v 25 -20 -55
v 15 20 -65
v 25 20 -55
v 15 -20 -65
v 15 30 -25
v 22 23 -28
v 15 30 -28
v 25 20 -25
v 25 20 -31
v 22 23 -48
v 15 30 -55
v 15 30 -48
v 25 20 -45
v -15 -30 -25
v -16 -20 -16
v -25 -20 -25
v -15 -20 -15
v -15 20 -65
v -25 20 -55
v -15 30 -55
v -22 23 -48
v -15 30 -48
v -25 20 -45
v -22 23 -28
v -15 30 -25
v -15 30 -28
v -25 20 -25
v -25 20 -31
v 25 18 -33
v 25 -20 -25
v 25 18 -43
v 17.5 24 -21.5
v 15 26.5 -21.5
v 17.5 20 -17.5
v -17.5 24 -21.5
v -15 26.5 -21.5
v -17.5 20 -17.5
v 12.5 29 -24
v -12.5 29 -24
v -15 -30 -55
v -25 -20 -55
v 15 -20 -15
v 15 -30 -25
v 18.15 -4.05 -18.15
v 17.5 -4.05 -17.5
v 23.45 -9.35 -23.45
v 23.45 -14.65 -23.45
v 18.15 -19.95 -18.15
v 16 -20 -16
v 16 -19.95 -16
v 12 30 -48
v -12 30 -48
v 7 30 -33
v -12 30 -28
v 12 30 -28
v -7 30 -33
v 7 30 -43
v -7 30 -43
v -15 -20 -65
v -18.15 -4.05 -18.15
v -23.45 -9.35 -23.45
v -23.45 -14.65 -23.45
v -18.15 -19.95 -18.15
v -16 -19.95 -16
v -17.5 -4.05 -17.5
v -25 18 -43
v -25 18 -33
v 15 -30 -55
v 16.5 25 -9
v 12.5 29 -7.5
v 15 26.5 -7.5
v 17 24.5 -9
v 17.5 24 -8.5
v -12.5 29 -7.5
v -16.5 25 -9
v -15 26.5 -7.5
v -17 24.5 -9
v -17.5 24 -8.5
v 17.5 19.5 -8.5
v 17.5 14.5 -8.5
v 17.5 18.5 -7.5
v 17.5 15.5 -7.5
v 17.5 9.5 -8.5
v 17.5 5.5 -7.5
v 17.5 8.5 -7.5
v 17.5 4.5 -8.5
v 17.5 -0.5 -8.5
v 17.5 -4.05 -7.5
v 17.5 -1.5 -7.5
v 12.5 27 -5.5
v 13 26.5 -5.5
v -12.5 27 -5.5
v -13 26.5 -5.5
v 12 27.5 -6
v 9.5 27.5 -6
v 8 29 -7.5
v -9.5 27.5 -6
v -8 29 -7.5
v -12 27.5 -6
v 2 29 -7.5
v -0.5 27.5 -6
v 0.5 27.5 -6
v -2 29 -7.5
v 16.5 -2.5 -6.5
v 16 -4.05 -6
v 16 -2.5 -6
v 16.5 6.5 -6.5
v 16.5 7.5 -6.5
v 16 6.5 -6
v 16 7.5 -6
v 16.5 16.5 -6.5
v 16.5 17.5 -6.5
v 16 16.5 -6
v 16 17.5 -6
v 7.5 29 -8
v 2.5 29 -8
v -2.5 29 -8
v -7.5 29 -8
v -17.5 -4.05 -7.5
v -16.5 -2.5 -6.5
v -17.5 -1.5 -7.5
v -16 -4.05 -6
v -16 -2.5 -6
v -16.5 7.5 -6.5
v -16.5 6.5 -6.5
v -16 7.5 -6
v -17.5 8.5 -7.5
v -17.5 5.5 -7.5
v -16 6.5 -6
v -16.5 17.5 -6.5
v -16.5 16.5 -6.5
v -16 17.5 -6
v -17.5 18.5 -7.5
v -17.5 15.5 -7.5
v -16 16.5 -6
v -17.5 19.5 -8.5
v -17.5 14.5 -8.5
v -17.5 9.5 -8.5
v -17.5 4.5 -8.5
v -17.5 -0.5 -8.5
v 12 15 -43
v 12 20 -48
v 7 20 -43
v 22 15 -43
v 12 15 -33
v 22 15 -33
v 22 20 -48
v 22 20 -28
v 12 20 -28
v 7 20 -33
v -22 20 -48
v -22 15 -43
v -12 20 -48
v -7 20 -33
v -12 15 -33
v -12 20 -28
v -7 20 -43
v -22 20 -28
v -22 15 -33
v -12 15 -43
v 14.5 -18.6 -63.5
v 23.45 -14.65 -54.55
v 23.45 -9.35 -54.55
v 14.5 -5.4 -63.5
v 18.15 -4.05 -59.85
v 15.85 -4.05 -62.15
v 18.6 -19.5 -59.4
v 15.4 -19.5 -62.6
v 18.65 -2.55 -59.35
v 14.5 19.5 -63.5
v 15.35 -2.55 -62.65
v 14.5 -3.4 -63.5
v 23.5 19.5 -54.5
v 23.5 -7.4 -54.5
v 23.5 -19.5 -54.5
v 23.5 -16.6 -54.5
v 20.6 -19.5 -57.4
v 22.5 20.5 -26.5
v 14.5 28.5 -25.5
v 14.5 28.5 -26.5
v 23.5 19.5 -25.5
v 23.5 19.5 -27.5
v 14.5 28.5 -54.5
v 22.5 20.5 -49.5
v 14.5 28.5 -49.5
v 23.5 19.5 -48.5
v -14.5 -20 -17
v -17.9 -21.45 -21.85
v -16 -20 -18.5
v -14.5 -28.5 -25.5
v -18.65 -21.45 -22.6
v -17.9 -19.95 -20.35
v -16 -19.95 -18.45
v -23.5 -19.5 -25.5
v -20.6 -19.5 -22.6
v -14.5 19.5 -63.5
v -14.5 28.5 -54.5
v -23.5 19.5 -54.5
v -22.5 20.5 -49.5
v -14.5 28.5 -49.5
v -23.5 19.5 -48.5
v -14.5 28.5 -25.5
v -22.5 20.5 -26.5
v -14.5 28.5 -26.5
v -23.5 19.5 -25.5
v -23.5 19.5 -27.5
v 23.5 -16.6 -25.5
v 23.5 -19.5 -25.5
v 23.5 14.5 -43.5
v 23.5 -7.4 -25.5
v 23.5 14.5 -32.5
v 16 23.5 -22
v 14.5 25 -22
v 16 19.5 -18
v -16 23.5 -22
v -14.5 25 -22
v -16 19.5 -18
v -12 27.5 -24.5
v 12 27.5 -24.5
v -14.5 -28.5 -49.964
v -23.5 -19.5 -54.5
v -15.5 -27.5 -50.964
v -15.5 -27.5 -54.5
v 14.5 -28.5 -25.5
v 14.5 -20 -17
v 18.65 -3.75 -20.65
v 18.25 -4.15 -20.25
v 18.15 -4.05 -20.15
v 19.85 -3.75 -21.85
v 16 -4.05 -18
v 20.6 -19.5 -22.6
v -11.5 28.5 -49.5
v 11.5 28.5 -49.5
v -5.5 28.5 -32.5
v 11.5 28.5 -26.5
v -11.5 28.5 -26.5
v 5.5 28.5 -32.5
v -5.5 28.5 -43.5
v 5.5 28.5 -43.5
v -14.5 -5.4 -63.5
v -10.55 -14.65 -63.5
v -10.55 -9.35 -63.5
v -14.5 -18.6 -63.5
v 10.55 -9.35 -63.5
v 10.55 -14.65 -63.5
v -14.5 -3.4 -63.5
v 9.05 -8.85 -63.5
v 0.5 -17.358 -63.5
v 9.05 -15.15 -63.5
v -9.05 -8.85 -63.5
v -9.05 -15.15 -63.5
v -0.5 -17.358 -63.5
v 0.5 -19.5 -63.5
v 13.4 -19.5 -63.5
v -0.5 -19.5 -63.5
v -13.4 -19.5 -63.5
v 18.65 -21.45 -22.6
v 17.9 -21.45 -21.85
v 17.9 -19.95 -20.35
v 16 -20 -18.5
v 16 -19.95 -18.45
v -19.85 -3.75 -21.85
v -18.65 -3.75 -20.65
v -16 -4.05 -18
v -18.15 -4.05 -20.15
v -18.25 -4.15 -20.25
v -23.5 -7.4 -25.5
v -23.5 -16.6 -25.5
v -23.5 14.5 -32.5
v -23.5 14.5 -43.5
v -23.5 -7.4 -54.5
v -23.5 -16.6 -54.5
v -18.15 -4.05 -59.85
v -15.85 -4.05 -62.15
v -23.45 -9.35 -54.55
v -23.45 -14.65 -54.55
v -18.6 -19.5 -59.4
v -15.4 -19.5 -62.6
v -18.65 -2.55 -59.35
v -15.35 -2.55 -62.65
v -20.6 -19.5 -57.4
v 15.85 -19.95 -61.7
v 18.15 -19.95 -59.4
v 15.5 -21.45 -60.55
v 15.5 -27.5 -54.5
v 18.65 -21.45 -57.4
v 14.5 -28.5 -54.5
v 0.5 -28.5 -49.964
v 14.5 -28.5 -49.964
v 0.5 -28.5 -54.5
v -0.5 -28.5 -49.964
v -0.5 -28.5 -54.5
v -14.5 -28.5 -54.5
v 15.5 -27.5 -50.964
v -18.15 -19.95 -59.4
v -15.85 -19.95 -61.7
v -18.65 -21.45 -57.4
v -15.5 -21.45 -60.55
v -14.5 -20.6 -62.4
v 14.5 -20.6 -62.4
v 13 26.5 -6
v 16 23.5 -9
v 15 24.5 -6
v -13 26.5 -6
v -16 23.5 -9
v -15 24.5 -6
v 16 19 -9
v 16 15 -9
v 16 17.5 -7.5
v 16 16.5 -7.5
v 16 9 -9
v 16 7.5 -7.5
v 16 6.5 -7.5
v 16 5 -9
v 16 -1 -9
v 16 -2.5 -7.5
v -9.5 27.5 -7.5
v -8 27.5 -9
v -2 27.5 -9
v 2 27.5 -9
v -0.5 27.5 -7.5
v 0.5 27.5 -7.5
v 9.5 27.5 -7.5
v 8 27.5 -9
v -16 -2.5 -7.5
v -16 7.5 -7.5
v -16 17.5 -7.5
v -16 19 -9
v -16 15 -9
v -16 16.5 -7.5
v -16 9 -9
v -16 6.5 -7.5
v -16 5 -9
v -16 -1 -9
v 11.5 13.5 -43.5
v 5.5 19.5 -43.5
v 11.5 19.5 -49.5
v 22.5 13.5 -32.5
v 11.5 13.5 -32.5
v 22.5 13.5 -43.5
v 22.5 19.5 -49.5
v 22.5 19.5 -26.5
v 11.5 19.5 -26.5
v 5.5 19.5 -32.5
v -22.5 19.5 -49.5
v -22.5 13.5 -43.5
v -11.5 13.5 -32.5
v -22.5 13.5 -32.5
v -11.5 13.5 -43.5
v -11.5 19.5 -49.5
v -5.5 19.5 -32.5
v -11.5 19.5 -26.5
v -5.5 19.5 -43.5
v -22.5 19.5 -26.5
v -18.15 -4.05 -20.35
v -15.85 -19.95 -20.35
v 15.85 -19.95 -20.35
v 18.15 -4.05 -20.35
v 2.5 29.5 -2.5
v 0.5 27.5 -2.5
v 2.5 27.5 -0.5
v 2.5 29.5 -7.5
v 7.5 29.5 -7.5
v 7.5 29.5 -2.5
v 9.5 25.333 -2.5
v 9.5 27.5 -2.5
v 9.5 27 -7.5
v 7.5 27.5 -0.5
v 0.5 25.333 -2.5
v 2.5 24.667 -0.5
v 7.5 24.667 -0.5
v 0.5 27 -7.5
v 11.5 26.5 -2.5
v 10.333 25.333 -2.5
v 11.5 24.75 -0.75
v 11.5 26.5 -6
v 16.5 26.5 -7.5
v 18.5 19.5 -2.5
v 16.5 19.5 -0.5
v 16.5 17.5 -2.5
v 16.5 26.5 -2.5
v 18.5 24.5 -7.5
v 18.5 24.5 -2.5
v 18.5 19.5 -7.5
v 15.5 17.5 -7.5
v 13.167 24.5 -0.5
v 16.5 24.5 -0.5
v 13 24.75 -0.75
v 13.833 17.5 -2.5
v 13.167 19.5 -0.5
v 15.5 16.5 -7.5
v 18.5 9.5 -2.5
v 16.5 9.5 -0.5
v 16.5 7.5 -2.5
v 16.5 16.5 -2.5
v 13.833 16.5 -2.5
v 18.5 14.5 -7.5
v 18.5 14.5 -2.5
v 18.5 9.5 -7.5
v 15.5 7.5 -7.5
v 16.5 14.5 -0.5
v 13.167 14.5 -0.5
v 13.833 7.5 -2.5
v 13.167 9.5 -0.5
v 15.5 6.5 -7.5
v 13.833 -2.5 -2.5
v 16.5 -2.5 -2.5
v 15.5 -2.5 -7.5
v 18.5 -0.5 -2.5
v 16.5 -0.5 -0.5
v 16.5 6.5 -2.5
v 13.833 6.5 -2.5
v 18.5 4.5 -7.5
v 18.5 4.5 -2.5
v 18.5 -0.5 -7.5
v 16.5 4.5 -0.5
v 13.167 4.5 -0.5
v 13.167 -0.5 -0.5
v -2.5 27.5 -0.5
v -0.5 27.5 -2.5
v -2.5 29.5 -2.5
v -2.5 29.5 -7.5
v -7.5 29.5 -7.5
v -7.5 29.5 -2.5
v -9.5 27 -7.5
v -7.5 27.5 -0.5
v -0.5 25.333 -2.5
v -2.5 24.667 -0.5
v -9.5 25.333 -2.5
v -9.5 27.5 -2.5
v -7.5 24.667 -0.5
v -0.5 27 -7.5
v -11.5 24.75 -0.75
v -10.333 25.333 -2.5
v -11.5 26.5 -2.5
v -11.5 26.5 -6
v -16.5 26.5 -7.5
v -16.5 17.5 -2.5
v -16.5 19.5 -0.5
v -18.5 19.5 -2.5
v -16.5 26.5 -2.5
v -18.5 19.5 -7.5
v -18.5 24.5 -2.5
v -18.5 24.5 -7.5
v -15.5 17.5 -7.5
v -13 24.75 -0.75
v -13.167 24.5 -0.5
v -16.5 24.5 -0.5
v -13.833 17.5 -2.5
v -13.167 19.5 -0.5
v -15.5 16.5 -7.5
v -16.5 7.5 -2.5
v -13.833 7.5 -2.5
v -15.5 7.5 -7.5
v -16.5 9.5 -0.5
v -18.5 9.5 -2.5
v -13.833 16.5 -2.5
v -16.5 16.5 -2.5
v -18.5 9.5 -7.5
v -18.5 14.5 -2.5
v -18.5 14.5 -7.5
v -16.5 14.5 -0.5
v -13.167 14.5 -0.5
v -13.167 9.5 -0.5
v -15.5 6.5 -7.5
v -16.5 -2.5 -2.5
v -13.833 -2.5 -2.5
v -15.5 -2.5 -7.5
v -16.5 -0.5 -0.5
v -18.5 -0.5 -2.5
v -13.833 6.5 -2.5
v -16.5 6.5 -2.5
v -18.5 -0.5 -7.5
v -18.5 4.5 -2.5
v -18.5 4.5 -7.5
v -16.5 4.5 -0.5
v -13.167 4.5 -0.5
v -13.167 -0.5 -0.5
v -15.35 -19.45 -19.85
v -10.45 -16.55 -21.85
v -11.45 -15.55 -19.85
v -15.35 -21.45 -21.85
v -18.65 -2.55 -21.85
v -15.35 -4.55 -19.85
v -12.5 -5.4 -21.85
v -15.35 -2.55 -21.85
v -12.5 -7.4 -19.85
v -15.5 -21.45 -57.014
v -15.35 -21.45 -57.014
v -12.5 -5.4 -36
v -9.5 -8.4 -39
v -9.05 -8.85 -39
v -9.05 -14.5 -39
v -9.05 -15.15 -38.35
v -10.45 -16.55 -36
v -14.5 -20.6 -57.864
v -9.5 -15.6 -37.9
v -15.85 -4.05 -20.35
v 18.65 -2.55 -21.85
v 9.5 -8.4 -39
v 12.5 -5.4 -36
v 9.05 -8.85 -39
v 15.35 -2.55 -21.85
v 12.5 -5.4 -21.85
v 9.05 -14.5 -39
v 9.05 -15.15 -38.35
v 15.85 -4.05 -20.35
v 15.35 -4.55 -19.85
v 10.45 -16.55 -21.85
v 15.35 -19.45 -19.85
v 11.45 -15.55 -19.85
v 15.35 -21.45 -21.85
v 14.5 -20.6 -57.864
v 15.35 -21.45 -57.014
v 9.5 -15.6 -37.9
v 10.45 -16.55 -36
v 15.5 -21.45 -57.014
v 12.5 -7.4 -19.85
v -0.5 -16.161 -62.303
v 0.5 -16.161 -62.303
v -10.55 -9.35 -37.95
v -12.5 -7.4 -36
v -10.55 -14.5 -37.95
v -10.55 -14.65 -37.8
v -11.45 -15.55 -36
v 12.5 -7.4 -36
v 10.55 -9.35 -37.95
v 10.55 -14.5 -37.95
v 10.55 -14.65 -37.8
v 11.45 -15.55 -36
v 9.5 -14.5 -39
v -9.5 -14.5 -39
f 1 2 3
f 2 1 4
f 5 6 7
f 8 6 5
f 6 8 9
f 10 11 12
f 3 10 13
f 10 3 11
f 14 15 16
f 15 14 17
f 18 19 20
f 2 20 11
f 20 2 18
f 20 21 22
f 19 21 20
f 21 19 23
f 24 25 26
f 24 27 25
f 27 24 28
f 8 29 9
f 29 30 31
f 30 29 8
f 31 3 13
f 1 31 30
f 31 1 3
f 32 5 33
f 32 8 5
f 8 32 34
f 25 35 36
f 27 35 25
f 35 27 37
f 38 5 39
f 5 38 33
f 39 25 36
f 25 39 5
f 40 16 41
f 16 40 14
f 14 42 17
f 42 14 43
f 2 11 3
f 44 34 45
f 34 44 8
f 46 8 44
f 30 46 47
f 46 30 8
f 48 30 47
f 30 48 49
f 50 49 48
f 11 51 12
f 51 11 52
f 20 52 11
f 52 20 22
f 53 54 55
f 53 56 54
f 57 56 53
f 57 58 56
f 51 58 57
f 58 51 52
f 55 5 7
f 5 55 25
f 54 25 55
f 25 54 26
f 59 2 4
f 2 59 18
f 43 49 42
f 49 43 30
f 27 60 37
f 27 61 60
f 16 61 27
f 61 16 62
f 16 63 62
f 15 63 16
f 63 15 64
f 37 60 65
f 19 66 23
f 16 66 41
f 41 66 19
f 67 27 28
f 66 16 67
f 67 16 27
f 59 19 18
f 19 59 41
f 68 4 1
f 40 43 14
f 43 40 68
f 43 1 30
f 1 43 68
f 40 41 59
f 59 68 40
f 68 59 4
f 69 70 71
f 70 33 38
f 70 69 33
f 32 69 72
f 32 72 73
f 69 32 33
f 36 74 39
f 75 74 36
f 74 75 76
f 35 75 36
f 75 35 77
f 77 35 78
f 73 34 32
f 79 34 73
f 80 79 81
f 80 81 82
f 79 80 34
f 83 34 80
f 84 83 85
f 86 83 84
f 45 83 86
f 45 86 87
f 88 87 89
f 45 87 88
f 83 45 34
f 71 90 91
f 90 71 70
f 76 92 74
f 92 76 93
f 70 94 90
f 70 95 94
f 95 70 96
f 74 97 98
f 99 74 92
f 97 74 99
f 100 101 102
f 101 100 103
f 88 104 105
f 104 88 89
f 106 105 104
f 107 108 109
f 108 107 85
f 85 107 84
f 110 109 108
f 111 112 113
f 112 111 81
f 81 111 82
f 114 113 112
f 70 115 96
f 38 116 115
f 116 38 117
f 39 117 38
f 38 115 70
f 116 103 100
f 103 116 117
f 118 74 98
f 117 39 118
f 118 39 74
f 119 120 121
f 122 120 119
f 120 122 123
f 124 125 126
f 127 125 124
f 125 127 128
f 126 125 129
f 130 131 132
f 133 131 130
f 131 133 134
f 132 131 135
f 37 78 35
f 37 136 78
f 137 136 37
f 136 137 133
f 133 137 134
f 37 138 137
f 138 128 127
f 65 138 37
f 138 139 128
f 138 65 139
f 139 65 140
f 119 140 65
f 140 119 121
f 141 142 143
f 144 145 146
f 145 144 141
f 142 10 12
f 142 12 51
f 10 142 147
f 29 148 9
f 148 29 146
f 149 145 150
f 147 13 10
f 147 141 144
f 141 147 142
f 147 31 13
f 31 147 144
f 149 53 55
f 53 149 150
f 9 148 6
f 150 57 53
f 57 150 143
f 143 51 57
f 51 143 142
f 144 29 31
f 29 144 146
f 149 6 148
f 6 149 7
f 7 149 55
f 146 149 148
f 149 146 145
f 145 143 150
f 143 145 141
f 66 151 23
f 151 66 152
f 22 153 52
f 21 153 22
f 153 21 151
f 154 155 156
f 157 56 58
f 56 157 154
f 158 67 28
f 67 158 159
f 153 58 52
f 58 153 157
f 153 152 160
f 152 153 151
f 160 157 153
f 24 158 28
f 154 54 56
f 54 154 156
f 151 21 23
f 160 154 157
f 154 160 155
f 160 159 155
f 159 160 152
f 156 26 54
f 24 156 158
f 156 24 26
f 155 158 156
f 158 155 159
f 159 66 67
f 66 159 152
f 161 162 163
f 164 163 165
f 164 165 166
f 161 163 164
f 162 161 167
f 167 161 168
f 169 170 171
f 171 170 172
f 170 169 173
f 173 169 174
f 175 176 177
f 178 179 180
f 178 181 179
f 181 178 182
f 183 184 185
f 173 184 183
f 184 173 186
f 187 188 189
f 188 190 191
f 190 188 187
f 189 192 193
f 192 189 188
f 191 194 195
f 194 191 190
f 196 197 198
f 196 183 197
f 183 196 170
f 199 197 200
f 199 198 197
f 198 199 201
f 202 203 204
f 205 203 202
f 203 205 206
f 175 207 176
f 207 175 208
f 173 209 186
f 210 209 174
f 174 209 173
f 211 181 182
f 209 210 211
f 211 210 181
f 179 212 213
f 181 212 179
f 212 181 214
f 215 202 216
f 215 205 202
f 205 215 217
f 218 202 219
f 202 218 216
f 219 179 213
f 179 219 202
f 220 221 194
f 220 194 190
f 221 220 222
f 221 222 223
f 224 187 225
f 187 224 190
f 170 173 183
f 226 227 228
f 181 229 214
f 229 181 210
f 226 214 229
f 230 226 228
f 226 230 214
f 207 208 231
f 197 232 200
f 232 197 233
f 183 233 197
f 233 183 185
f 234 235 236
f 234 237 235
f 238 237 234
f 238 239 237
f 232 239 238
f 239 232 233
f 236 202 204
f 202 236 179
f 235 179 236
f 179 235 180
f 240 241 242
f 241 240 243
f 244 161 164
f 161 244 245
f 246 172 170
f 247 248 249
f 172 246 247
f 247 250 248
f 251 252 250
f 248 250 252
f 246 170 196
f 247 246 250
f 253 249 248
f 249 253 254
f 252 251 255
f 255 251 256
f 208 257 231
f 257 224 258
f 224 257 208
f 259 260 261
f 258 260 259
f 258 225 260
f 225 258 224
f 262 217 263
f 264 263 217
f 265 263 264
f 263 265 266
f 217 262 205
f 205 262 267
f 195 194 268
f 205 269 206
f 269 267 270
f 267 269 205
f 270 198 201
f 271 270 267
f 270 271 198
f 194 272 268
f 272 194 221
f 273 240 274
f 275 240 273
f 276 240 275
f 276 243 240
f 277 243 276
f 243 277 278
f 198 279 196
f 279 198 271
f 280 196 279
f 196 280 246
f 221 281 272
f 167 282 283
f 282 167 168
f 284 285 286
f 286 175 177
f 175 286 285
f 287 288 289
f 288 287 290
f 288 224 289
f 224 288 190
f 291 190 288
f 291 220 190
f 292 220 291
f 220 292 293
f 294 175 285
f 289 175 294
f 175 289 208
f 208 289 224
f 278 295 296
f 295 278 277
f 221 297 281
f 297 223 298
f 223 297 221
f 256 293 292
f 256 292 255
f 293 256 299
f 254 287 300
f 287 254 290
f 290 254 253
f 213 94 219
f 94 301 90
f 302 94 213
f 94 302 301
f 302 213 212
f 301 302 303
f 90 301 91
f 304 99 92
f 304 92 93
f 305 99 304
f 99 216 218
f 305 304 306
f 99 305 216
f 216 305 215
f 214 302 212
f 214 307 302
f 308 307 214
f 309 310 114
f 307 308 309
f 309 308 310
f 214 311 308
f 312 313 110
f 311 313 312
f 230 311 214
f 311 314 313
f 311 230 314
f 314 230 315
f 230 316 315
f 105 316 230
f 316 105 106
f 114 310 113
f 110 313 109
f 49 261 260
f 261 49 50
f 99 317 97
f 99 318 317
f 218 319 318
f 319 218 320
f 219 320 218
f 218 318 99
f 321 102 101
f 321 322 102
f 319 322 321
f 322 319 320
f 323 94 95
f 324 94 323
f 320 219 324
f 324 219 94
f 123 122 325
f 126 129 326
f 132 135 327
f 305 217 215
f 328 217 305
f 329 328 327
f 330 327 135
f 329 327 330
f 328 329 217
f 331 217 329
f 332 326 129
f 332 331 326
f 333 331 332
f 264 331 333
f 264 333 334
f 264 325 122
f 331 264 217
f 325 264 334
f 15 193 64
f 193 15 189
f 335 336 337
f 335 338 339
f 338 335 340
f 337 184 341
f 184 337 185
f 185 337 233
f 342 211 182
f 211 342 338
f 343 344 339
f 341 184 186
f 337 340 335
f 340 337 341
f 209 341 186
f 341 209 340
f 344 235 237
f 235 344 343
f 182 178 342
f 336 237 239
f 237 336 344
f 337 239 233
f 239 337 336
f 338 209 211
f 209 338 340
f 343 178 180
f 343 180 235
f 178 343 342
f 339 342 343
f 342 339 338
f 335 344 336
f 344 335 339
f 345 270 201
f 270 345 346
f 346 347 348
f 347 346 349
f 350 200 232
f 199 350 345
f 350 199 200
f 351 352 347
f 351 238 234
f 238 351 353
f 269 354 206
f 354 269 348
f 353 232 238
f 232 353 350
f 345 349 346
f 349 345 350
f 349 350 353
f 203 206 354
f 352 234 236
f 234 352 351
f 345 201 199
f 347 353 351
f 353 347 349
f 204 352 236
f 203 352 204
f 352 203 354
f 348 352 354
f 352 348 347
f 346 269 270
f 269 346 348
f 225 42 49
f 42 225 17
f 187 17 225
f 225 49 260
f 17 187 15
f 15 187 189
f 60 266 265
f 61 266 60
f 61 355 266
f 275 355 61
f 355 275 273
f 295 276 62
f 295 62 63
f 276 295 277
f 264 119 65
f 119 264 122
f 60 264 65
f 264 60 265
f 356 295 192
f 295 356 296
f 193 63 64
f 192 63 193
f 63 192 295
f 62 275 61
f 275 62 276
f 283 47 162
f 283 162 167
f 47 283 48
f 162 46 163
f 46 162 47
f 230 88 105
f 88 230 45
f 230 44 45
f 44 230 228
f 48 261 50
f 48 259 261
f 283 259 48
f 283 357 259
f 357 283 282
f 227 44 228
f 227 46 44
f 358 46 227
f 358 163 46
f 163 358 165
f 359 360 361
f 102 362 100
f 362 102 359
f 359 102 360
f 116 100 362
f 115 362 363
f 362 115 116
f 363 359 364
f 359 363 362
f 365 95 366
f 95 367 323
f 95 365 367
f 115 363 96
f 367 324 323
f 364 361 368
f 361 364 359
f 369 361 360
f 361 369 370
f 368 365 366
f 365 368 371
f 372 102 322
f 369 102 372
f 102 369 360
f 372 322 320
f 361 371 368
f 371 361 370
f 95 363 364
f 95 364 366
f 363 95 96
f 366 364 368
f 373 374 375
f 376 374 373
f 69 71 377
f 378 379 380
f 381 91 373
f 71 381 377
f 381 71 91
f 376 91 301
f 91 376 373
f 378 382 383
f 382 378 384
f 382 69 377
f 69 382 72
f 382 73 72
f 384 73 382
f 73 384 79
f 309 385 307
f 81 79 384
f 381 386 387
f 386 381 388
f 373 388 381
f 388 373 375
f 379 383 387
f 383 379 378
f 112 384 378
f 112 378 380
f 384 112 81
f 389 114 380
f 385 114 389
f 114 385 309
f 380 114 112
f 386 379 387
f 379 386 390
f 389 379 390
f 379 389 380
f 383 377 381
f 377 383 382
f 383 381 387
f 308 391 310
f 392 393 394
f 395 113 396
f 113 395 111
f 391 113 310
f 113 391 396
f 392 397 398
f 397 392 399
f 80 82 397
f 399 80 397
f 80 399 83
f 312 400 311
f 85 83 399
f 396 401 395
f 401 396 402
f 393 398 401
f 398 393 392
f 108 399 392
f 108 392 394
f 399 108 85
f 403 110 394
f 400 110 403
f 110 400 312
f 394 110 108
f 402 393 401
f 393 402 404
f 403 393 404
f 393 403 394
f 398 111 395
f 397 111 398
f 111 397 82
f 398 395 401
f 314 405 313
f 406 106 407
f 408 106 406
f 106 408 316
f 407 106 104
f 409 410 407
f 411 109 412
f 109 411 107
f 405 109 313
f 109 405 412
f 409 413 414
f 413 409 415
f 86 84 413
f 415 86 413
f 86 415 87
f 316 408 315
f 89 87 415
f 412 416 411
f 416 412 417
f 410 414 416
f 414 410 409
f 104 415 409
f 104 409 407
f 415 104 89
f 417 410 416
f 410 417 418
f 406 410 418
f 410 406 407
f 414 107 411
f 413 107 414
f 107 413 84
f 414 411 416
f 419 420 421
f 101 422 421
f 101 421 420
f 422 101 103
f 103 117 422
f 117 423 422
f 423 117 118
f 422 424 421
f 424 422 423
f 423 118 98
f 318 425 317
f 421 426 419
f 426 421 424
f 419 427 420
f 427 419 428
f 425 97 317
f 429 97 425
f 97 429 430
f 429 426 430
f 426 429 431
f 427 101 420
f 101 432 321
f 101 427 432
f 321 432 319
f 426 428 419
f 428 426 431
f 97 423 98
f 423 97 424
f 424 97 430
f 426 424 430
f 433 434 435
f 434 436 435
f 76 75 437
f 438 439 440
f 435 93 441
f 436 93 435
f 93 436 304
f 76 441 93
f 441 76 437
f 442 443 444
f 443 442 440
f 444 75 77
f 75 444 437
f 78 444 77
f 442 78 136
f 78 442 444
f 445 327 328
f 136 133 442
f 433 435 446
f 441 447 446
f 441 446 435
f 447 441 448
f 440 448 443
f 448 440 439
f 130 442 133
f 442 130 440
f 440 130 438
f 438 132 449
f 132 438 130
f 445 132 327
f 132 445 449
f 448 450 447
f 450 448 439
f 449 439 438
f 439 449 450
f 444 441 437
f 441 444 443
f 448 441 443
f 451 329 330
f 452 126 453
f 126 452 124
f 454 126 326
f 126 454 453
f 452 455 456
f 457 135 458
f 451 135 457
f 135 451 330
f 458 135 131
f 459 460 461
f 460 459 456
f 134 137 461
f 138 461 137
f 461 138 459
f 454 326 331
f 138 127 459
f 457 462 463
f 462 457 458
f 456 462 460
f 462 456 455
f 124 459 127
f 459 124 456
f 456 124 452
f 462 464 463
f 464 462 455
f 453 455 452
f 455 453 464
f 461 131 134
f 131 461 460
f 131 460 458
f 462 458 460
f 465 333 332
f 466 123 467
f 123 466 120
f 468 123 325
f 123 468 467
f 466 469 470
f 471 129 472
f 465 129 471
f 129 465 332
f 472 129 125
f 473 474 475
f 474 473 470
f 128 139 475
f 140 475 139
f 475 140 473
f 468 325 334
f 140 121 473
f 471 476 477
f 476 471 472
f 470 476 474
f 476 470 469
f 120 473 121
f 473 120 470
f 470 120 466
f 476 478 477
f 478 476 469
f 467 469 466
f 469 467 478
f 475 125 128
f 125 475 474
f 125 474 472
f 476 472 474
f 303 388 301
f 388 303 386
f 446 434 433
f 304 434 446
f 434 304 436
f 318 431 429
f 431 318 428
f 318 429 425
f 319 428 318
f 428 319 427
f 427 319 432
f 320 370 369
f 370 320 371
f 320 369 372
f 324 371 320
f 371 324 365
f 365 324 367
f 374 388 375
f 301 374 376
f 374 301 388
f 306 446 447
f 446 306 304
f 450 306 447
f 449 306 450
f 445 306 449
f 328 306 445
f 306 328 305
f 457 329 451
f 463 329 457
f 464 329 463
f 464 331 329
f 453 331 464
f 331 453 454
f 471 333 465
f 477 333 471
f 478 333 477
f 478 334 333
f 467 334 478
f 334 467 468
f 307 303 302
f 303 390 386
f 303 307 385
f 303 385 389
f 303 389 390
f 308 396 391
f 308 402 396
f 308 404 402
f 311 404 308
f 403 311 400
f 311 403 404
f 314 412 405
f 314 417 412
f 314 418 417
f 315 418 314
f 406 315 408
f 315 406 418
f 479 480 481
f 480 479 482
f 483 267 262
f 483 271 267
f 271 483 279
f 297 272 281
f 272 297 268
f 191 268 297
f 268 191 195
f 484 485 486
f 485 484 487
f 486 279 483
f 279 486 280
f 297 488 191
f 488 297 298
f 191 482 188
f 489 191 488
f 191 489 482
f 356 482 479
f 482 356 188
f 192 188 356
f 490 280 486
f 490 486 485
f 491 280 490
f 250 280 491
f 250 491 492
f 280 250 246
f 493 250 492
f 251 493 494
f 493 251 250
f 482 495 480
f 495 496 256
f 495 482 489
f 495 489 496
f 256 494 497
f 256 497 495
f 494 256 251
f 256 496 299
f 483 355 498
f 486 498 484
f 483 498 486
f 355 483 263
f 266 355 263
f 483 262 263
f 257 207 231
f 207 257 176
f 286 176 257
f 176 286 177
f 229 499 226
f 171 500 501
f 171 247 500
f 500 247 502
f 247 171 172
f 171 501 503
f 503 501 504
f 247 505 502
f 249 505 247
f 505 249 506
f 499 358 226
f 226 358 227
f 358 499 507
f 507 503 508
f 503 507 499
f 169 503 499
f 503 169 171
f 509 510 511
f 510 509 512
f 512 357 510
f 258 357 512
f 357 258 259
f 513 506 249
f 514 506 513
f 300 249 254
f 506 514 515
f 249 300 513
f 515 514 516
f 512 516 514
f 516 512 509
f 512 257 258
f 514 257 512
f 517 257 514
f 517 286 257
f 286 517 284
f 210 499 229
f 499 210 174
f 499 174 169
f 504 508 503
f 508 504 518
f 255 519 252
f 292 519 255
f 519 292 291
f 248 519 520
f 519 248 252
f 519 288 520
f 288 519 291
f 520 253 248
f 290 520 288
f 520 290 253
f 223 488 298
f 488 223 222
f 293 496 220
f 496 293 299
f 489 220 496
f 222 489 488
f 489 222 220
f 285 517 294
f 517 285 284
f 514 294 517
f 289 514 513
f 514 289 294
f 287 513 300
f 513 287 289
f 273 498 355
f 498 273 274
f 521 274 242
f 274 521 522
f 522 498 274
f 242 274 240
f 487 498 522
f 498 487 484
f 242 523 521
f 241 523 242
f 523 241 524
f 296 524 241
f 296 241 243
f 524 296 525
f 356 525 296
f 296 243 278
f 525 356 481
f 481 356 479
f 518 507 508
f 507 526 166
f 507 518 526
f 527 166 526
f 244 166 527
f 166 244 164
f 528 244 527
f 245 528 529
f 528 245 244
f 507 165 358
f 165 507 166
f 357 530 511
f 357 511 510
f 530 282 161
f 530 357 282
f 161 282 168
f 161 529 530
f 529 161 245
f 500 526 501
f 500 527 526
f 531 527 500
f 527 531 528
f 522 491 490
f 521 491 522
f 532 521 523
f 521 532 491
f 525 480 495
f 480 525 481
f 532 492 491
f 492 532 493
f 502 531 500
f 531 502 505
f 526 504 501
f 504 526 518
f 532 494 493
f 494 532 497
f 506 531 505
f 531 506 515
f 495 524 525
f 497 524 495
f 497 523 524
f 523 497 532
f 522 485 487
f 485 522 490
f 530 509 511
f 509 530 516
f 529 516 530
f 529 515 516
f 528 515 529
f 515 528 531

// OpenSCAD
module camera(){
	translate([0,0,32.5]){
		cube([65,65,65],center=true);
	};
};
module cell(){
	translate([0,0,49.5]){
		//cube([18,26,1],center=true);
	};
	translate([0,6,45]){
		cylinder(3,4,4);
	};
	translate([0,-6,45]){
		cylinder(3,3,3);
	};
	translate([0,0,22.5]){
		cube([18,26,45],center=true);
	};
};
//cell();
module gem(size,cha){
	hull(){
		translate([cha,0,0]){cube(size,center=true);};
		translate([-cha,0,0]){cube(size,center=true);};
		translate([0,0,cha]){cube(size,center=true);};
		translate([0,0,-cha]){cube(size,center=true);};
		translate([0,cha,0]){cube(size,center=true);};
		translate([0,-cha,0]){cube(size,center=true);};
	};
};
/*
translate([0,0,0]){gem([10,10,10],5);}
translate([50,0,0]){gem([10,10,20],3);}
translate([-50,0,0]){gem([20,5,30],2);}
*/
t=1;
babyface=17;
module skull(t){
	difference(){
		union(){
			translate([0, 0,40]){gem([30-t,40-t,30-t],10-t);};
			translate([0,-9,20]){gem([25-t,30-t,25-t],5-t);};
		};
		union(){
			translate([ babyface,-25,38]){gem([10+t,10+t,10+t],5+t);};
			translate([-babyface,-25,38]){gem([10+t,10+t,10+t],5+t);};
		};
	};
};
module teeth(){
	translate([5,-25,5]){gem([5,5,5],2);};
	translate([14,-22,5]){gem([5,5,5],2);};
	translate([14,-12,5]){gem([5,5,5],2);};
	translate([14,-2,5]){gem([5,5,5],2);};
};
module teethL(){
	translate([4,-25,5]){gem([5,5,5],2);};
	translate([13,-22,5]){gem([5,5,5],2);};
	translate([13,-12,5]){gem([5,5,5],2);};
	translate([13,-2,5]){gem([5,5,5],2);};
};

module batteryBox(s,h){
	gem([18+s,26+s,51+s+h],2+s);
};

// mandibula inserts negative width
w=0.3;
m=1;
module hollowSkull(t){
	difference(){
		skull(0);
		union(){
			skull(t);
			translate([0,-9+5,5]){gem([25-t,30+(5*2)-t,30-t],5-t);};
			translate([0,14,5]){cube([33-t,3+(5*2)-t,30-t],center=true);};
// mandibula inserts negative
			translate([-17,12,8]){gem([2+w,5+w,41+w],5+w);};
			mirror(){translate([-17,12,8]){gem([2+w,5+w,41+w],5+w);};};
		};
	};
	difference(){
		union(){
			teeth();
			mirror(){teeth();};
		};
		union(){
			scale([1,1,3]){translate([0,-8,7]){gem([26,26+(4*2)-t,6],4);};};
		};
	};
// mandibula inserts positive
	difference(){
		union(){
			//pipe positives
			translate([-17,12,43]){gem([2+w+m,5+w+m,41+w+m],5+w+m);};
			mirror(){translate([-17,12,43]){gem([2+w+m,5+w+m,41+w+m],5+w+m);};};
			//contrafoces
			translate([0,25,57]){rotate([45]){cube([1,5,20],center=true);};};
			translate([-15,25,57]){rotate([45]){cube([1,5,20],center=true);};};
			mirror(){
				translate([-15,25,57]){rotate([45]){cube([1,5,20],center=true);};};
			};
		};
		union(){
			difference(){
				translate([0,0,50]){cube([90,90,90],center=true);}
				translate([0, 0,40]){gem([30-t,40-t,30-t],10-t);};
			};
			translate([-17,12,43]){gem([2+w,5+w,50+w],5+w);};
			mirror(){translate([-17,12,43]){gem([2+w,5+w,50+w],5+w);};};
			translate([0,1,10]){
				batteryBox(1,0);
			};
		};
	};
};
module mandibula(t){
	hull(){
		translate([0,-7,-10]){gem([25-t,30-t,5-t],5-t);};
		translate(			 [-17,12,-10]){gem([2-t,5-t,5-t],5-t);};
		mirror(){translate([-17,12,-10]){gem([2-t,5-t,5-t],5-t);};};
	};
	translate([-17,12,20]){gem([2-t,5-t,60-t],5-t);};
	mirror(){translate([-17,12,20]){gem([2-t,5-t,60-t],5-t);};};

};
module hollowMandibula(t){
	difference(){
		union(){
			difference(){
				union(){
					difference(){
						mandibula(0);
						mandibula(t);
					};
					difference(){
						translate([0,2,-9]){
							union(){
								teethL();
								mirror(){teethL();};
							};
						};
					};
				};
				union(){
					translate([0,-7,-5]){gem([25-(t*2),30-(t*2),10-(t*2)],5-(t*2));};
					translate([0,1,22.5]){
						gem([18,26,60],1);
					};
				};
			};
			difference(){
				translate([0,1,10]){
					batteryBox(0,0);
				};
				translate([0,1,22.5]){
					batteryBox(-1,50);
		
				};
			};
		};
		translate([0,0,97]){cube([100,100,100],center=true);}
	};
};

module testCase(){
	difference(){
		union(){
			color([1,1,.8]){hollowSkull(1);};
			hollowMandibula(1);
		};
		//translate([0,-50,-20]){cube(100,100,100);}
		//translate([0,-50,20]){cube(100,100,100);}
		//translate([-50,-50,10]){cube(100,100,100);}
		translate([-50,-90,-20]){cube(100,100,100);}
	};
};
//testCase();
//%translate([0,1,-5]){cell();};
//%translate([0,0]){camera();};
//%translate([0,0,-18]){camera();};//mandibula
//hollowMandibula(1);
rotate([180,0,0]){hollowSkull(1);}
